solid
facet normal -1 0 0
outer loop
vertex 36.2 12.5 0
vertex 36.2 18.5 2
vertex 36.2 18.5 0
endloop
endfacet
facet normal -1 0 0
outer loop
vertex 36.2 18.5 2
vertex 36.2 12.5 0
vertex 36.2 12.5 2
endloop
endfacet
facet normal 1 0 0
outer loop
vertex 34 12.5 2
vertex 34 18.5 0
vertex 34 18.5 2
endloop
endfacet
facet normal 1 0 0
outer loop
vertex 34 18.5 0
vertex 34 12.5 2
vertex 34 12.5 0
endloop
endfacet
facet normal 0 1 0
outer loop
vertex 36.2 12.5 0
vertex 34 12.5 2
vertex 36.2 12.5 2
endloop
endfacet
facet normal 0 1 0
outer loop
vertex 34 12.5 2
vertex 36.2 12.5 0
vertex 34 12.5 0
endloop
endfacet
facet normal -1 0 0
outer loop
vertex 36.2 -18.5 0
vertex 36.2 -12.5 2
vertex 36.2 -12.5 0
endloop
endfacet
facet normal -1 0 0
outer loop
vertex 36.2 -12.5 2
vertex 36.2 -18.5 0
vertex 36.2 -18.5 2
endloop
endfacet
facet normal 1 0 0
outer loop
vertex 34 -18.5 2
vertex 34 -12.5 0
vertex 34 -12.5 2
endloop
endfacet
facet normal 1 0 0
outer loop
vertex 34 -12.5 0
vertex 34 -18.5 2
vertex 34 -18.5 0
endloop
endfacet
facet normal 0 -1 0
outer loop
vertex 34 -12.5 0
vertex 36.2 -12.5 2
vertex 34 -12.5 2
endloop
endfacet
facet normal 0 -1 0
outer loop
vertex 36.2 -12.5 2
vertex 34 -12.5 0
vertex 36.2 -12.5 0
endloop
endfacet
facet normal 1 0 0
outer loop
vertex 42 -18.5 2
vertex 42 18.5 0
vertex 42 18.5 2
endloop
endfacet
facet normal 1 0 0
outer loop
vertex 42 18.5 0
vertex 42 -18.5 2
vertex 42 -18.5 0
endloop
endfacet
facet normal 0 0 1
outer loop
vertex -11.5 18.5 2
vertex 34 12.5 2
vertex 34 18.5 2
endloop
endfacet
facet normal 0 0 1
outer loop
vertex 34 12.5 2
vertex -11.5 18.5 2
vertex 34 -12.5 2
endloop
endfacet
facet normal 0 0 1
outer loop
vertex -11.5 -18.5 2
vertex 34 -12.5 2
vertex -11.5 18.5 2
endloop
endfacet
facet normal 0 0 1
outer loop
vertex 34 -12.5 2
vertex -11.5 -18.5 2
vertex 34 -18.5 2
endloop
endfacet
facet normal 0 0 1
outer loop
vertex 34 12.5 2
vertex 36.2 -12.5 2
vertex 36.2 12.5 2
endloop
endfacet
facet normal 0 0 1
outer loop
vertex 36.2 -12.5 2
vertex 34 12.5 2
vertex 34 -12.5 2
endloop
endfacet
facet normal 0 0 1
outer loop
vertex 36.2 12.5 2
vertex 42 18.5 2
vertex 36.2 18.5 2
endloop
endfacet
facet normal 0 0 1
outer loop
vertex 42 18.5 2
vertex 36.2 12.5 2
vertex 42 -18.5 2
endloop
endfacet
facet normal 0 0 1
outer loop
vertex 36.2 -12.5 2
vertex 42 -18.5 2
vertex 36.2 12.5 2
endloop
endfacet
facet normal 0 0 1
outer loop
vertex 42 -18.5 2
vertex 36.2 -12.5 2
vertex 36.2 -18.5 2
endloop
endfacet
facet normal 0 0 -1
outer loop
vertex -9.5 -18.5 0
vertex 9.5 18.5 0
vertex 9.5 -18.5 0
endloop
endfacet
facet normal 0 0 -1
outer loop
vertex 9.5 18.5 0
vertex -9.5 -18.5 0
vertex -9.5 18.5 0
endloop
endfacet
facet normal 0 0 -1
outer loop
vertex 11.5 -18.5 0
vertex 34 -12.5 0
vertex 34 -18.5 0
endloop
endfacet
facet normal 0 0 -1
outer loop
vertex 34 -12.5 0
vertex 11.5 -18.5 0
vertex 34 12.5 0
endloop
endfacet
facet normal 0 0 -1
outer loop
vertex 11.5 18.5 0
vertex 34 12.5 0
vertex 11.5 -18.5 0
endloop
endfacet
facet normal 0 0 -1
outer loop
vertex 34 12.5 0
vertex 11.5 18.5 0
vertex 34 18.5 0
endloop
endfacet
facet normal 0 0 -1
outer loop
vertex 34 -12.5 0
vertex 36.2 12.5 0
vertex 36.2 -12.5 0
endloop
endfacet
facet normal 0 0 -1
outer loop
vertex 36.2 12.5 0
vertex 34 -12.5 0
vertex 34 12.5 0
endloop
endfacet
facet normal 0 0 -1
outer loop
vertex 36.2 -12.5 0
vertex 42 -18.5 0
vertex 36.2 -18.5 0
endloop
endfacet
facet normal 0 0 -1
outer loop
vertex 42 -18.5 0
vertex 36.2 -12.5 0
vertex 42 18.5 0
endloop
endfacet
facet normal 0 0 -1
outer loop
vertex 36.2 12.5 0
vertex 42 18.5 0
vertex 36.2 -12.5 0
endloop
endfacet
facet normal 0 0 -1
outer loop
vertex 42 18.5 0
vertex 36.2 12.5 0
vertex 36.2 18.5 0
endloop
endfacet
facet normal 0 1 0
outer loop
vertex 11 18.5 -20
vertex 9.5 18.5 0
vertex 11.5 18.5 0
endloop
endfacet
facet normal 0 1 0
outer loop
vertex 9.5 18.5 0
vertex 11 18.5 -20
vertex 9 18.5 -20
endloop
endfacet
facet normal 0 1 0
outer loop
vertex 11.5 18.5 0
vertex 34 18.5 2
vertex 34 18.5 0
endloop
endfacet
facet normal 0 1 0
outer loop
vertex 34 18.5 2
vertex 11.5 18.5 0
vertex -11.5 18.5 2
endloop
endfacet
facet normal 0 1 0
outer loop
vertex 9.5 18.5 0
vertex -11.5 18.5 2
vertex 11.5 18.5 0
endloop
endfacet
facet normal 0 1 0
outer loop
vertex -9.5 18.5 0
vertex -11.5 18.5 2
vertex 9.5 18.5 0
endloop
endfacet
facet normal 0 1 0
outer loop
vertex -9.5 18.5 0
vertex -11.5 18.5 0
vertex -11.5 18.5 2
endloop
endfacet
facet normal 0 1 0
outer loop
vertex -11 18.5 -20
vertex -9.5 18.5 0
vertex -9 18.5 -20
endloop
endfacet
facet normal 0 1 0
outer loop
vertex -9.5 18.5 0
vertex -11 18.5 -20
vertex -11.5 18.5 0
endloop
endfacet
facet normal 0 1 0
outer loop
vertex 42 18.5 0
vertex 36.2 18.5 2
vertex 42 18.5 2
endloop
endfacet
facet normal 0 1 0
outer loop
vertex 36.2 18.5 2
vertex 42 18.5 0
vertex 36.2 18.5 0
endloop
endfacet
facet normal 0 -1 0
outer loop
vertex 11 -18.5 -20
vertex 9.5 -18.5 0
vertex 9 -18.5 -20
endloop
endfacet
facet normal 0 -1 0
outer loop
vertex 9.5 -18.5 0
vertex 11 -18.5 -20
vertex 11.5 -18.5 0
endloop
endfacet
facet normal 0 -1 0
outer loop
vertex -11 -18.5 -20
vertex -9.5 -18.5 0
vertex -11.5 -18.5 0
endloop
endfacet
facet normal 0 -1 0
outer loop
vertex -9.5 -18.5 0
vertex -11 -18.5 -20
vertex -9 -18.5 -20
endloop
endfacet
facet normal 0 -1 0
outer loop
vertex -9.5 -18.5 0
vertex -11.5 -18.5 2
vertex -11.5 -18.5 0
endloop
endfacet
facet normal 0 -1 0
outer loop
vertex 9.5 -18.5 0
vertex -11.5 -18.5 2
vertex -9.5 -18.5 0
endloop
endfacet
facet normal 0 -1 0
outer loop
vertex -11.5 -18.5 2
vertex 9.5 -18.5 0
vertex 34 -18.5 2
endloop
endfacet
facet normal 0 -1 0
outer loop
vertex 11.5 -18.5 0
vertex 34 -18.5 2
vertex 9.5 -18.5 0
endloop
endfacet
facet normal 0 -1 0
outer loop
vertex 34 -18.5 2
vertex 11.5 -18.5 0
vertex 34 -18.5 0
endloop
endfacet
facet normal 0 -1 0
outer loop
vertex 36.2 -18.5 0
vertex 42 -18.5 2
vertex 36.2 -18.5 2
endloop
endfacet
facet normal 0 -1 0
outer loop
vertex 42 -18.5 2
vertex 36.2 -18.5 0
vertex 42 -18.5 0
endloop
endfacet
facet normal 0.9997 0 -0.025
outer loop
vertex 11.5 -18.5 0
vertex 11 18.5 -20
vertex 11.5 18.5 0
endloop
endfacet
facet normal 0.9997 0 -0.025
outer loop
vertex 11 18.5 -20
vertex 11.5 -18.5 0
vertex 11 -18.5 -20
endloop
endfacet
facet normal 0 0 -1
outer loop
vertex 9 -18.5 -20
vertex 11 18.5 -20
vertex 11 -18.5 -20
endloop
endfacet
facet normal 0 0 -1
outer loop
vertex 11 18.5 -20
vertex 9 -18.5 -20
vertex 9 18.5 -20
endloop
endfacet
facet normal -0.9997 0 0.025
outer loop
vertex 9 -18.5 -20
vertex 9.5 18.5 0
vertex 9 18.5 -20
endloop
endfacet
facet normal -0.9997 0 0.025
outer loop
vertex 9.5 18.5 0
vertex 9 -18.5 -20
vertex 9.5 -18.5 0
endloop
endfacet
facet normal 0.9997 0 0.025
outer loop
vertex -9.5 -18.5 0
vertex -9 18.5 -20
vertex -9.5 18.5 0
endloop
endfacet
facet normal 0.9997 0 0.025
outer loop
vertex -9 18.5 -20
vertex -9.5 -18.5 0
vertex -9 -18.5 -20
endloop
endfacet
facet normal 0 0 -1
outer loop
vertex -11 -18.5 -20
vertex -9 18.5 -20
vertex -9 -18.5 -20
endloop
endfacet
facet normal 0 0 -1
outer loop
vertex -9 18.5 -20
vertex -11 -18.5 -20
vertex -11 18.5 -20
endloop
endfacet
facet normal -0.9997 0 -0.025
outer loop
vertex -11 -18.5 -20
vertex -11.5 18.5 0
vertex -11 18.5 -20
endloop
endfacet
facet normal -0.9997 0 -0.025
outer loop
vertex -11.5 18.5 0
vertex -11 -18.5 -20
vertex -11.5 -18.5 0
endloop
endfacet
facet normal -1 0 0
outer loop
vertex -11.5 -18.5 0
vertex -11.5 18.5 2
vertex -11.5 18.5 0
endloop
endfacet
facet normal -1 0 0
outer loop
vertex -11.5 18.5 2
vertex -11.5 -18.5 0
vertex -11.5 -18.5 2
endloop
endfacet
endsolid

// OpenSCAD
// file: syms.scad
module symY(t) {
    translate(t)
        children();
    mirror([0,1,0])
        translate(t)
            children();
}
module symX(t) {
    translate(t)
        children();
    mirror([1,0,0])
        translate(t)
            children();
}

module symZ(t) {
    translate(t)
        children();
    mirror([0,0,1])
        translate(t)
            children();
}

module	symXY(t) {
	tx=t[0];
	ty=t[1];
	tz=t[2];
	symX([tx,0,0])
	symY([0,ty,tz])
		children();
}

module magnetCut(D,S) {
    cylinder(d=D,h=10);
    for(d=[45,-45])
    rotate(d)
    cube([2*D,S,30],center=true);
}


// calculates the radius from "segment" paramers:
// https://en.wikipedia.org/wiki/Circular_segment
function    circleSlice2radius2(c,h) = (c*c/8/h)+ h/2;

function toInt(str) = 
    let(d = [for (s = str) ord(s) - 48], l = len(d) - 1)
    [for (i = 0, a = d[i];i <= l;i = i + 1, a = 10 * a + d[i]) a][l];
        
// main file
use<syms.scad>
$W=2;


A=20;

mode="clamp";


module clamp(iw1=19,iw2=18,h=20,l=40,w=2) {
    
    a0=iw1/2;
    a1=iw2/2;
    
    b0=a0+w;
    b1=a1+w;
    
    path=[
    
            [a0,0],
            [a1,h],
            [b1,h],
            [b0,0],
            [b0,-w],
            [-b0,-w],
            [-b0,0],
            [-b1,h],
            [-a1,h],
            [-a0,0],
    
    ];
    
    translate([0,0,-l/2])
    linear_extrude(l)
    polygon(path);
    
}


module hook() {
    
    l=45;
    d=9;
    w=$W;
    k=5*w;
    
    difference() {
        union() {
            translate([l/2,0,0])
            cube([l,w,w],center=true);
            translate([l,0,0])
            cube([w,k,w],center=true);
            cylinder(h=w,d=d+2*w,center=true);
        }
        cylinder(h=2*w,d=d,center=true);
    }
    
    
    
}

//clamp();

module fullClamp() {
    w=$W;
    q0=25;
    p0=34;
    q=q0+2*(3*w);
    p=p0+2*(2*w);
    
    
    rotate(-90,[1,0,0])
    clamp(l=q);    
    difference() {
        translate([p/2,0,w/2])
        cube([p,q,w],center=true);
        symY([p0,q0/2,-w])
        cube([w*1.1,5*w,5*w]);
    }
}

if(mode=="hook"){
    hook();
}
if(mode=="clamp"){
    
    fullClamp();
    
    
}
